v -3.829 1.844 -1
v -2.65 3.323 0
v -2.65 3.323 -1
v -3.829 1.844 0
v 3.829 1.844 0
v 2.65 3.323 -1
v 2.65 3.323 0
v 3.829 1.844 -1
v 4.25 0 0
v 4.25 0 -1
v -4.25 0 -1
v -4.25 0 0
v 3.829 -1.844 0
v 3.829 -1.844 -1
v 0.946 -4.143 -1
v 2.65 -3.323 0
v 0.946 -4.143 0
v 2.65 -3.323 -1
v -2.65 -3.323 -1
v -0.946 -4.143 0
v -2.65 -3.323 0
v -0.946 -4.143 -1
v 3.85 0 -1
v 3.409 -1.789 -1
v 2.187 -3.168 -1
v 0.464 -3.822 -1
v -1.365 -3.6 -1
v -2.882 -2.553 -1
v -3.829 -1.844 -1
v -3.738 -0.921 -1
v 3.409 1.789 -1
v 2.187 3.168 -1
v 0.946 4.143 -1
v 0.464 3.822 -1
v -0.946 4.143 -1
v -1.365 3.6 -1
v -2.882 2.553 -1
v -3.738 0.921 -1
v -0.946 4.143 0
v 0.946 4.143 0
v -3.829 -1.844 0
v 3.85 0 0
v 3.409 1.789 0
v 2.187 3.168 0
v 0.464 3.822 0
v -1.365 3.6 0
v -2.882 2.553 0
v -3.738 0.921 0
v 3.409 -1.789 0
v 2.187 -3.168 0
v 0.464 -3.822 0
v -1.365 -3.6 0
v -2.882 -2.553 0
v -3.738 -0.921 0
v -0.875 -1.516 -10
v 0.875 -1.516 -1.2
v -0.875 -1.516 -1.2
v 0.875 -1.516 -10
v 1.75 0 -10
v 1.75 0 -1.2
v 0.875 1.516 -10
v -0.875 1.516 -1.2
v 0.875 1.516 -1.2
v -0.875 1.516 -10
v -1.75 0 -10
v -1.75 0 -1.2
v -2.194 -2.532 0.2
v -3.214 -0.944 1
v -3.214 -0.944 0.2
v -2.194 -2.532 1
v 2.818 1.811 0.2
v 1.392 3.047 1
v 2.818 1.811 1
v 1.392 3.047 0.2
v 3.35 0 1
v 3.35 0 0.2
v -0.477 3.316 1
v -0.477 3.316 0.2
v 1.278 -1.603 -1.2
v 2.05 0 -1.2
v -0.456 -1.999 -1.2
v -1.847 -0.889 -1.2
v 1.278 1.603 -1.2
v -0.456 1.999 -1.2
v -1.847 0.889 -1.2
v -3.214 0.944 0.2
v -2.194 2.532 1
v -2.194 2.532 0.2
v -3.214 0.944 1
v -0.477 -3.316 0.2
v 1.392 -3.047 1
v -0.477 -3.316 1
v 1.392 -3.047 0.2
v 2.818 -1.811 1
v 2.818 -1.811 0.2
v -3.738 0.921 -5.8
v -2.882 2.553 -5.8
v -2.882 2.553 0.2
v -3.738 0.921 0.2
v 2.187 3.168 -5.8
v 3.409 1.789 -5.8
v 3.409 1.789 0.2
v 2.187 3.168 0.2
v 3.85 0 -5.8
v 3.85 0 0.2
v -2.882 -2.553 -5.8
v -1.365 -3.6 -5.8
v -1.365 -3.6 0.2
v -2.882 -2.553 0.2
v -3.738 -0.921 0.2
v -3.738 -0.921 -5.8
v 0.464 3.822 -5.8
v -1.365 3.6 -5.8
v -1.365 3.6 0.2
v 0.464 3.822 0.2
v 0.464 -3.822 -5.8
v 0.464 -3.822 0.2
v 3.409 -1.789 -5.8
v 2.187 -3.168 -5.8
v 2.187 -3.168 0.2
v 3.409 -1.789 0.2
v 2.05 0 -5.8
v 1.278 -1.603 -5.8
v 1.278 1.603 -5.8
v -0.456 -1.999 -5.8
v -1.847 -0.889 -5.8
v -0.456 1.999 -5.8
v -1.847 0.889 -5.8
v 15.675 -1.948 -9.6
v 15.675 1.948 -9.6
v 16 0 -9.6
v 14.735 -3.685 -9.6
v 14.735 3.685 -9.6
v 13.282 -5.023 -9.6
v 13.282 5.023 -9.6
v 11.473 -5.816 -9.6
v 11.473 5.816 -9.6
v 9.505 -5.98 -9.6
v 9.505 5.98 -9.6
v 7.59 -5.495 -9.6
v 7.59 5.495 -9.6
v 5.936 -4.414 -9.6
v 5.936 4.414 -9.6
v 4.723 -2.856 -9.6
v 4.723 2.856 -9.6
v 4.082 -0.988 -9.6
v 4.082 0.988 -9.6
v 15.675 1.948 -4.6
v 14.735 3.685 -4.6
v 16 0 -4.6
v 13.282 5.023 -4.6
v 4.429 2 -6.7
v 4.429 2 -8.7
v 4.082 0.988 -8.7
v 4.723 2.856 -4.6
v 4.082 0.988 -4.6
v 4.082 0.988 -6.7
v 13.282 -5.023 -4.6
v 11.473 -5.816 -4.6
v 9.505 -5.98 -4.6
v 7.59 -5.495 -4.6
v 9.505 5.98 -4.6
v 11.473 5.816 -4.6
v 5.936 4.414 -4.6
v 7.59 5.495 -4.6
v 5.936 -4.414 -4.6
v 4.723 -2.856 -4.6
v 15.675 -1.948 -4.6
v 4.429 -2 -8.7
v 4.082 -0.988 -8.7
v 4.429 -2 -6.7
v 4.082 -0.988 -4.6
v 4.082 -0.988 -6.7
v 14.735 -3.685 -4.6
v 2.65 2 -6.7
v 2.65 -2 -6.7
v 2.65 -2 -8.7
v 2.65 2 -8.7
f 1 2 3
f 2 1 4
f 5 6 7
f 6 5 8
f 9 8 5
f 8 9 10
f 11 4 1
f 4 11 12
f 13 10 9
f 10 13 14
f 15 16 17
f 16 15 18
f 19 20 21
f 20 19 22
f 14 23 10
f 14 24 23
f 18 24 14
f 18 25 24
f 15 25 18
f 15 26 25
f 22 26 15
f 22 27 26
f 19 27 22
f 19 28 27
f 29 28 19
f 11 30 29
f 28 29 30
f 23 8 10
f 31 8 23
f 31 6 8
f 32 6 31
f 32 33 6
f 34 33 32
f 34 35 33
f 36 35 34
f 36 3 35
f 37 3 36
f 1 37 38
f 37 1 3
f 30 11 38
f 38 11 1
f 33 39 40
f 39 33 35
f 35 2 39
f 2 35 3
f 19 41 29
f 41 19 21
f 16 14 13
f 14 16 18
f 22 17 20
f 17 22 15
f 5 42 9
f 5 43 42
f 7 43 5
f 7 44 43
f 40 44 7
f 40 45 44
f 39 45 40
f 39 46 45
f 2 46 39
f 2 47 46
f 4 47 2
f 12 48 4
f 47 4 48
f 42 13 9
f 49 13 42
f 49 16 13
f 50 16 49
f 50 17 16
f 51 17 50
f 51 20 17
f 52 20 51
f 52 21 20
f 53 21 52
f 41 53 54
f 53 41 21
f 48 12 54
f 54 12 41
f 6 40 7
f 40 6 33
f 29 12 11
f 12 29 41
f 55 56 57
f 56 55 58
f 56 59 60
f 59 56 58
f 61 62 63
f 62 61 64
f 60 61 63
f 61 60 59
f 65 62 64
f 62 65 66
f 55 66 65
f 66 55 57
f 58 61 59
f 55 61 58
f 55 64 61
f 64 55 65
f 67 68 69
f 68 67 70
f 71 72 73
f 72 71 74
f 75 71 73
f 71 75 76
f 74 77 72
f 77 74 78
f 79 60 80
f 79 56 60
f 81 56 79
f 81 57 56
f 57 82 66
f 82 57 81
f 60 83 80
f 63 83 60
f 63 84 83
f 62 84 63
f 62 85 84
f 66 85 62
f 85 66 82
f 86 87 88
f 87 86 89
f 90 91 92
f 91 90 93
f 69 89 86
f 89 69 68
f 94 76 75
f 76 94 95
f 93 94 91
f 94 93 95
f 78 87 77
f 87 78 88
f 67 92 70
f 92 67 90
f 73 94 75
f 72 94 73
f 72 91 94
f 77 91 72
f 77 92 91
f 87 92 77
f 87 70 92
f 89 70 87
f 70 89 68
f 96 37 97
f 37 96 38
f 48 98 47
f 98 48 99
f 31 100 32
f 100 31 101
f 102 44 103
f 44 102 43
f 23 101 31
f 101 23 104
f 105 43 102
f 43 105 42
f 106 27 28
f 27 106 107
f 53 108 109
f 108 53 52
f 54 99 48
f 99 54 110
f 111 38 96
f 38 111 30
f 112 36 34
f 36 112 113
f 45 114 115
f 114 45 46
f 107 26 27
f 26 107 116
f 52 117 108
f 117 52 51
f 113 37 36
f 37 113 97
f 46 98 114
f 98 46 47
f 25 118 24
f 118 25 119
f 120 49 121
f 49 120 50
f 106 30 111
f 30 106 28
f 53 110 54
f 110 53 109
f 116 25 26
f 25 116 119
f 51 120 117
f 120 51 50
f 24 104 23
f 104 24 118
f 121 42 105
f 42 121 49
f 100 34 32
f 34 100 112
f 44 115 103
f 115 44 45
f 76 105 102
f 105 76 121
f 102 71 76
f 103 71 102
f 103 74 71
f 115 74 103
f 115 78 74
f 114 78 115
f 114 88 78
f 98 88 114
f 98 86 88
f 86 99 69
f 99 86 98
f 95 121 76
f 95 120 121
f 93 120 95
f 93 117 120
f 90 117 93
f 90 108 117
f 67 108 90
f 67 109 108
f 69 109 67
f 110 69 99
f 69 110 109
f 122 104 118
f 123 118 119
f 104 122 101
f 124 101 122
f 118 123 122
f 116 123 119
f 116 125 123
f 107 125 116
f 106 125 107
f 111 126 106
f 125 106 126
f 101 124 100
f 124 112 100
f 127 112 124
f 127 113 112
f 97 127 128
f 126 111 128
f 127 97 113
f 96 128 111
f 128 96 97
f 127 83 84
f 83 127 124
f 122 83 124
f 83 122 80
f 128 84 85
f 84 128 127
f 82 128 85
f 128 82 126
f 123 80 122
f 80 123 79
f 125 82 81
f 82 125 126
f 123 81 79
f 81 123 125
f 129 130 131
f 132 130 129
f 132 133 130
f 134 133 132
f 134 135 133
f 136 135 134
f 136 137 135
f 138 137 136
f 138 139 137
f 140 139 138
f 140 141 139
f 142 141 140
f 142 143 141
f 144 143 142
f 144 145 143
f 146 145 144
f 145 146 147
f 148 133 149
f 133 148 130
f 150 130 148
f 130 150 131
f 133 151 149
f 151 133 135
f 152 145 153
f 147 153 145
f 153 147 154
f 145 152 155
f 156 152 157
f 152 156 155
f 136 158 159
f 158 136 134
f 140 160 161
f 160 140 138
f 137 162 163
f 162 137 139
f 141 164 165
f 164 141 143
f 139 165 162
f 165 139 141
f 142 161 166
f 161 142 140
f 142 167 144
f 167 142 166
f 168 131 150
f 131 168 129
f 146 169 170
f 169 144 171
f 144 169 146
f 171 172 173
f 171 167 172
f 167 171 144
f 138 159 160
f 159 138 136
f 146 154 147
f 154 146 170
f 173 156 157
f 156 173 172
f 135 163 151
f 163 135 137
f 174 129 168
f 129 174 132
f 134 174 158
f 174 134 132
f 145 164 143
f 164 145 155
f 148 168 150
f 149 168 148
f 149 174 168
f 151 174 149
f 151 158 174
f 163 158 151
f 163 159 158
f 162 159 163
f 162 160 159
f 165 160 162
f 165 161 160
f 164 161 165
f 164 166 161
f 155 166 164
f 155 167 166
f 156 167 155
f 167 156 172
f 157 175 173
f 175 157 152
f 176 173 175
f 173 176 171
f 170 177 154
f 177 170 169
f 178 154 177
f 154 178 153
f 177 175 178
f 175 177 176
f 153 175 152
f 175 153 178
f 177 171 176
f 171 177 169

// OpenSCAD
// Parameters
shank_diameter_mm = 3.5; //[1.75:7:0.1]
length_mm = 10; //[5:20:0.5]
head_diameter_mm = 6.7; //[3.35:13.4:0.1]
head_height_mm = 2.2; //[1.1:4.4:0.1]
overlap_mm = 1.2; //[0.5:2:0.1]  // ensure 1-2mm overlap for solid connections

washer_outer_diameter_mm = 8.5; //[4.25:17:0.1]
washer_thickness_mm = 1; //[0.5:2:0.1]
spacer_height_mm = 6; //[3:12:0.5]
spacer_wall_mm = 1.8; //[0.9:3.6:0.1]
spacer_clearance_mm = 0.3; //[0.1:0.8:0.05]

buzzer_diameter_mm = 12; //[6:24:0.5]
buzzer_height_mm = 5; //[2.5:10:0.5]
buzzer_offset_x_mm = 10; //[5:20:0.5]

bridge_thickness_mm = 2; //[1:4:0.1]
bridge_width_mm = 4; //[2:8:0.1]

// Derived radii
shank_r  = shank_diameter_mm/2;
head_r   = head_diameter_mm/2;
washer_r = washer_outer_diameter_mm/2;

spacer_outer_r = shank_r + spacer_clearance_mm + spacer_wall_mm;
spacer_inner_r = shank_r + spacer_clearance_mm;

buzzer_r = buzzer_diameter_mm/2;

// -------------------------
// Z stack (guaranteed overlap contacts)
// Reference: washer top at z=0
// -------------------------
z_washer_top    = 0;
z_washer_center = z_washer_top - washer_thickness_mm/2;
z_washer_bottom = z_washer_top - washer_thickness_mm;

// Head overlaps washer by overlap_mm
z_head_bottom = z_washer_top - overlap_mm;
z_head_center = z_head_bottom + head_height_mm/2;
z_head_top    = z_head_bottom + head_height_mm;

// Shank overlaps head by overlap_mm (shank top slightly inside head)
z_shank_top    = z_head_bottom + overlap_mm;
z_shank_center = z_shank_top - length_mm/2;
z_shank_bottom = z_shank_top - length_mm;

// Spacer overlaps washer by overlap_mm
z_spacer_top    = z_washer_bottom + overlap_mm;
z_spacer_center = z_spacer_top - spacer_height_mm/2;
z_spacer_bottom = z_spacer_top - spacer_height_mm;

// Buzzer overlaps spacer/bridge region by overlap_mm
z_buzzer_top    = z_spacer_bottom + overlap_mm;
z_buzzer_center = z_buzzer_top - buzzer_height_mm/2;
z_buzzer_bottom = z_buzzer_top - buzzer_height_mm;

// -------------------------
// Modules
// -------------------------

// Screw and Washer - unioned so screw is one connected solid with washer
module screw_and_washer() {
  color("DimGray")
  union() {
    // Shank
    translate([0, 0, z_shank_center])
      cylinder(r=shank_r, h=length_mm, center=true);

    // Pan Head
    translate([0, 0, z_head_center])
      cylinder(r=head_r, h=head_height_mm, center=true);

    // Washer (ring)
    difference() {
      translate([0, 0, z_washer_center])
        cylinder(r=washer_r, h=washer_thickness_mm, center=true);
      translate([0, 0, z_washer_center])
        cylinder(r=spacer_inner_r, h=washer_thickness_mm + 2*overlap_mm, center=true);
    }
  }
}

// PCB Spacer - ring
module pcb_spacer() {
  color("Silver")
  difference() {
    translate([0, 0, z_spacer_center])
      cylinder(r=spacer_outer_r, h=spacer_height_mm, center=true);
    translate([0, 0, z_spacer_center])
      cylinder(r=spacer_inner_r, h=spacer_height_mm + 2*overlap_mm, center=true);
  }
}

// Buzzer - positioned to overlap bridge in X and Z
module buzzer() {
  color("Black")
  translate([buzzer_offset_x_mm, 0, z_buzzer_center])
    cylinder(r=buzzer_r, h=buzzer_height_mm, center=true);
}

// Bridge - guaranteed to intersect BOTH spacer and buzzer (and also overlap in Z)
module buzzer_bridge() {
  color("Silver")
  union() {
    // X: extend slightly INTO spacer and INTO buzzer
    x_left_face  =  spacer_outer_r - overlap_mm;                 // inside spacer
    x_right_face =  buzzer_offset_x_mm - buzzer_r + overlap_mm;   // inside buzzer
    bridge_len   =  x_right_face - x_left_face;
    bridge_cx    = (x_left_face + x_right_face)/2;

    // Z: place bridge so it intersects buzzer bottom and spacer bottom region
    // Make bridge span across the interface: top slightly inside buzzer, bottom slightly inside spacer
    z_bridge_top    = z_buzzer_bottom + overlap_mm;              // inside buzzer
    z_bridge_bottom = z_spacer_bottom - overlap_mm;              // inside spacer
    bridge_h        = max(bridge_thickness_mm, z_bridge_top - z_bridge_bottom);
    z_bridge_c      = (z_bridge_top + z_bridge_bottom)/2;

    translate([bridge_cx, 0, z_bridge_c])
      cube([bridge_len, bridge_width_mm, bridge_h], center=true);
  }
}

// -------------------------
// Assembly (single connected solid)
// -------------------------
module assembly() {
  union() {
    screw_and_washer();
    pcb_spacer();
    buzzer();
    buzzer_bridge();
  }
}

assembly();
